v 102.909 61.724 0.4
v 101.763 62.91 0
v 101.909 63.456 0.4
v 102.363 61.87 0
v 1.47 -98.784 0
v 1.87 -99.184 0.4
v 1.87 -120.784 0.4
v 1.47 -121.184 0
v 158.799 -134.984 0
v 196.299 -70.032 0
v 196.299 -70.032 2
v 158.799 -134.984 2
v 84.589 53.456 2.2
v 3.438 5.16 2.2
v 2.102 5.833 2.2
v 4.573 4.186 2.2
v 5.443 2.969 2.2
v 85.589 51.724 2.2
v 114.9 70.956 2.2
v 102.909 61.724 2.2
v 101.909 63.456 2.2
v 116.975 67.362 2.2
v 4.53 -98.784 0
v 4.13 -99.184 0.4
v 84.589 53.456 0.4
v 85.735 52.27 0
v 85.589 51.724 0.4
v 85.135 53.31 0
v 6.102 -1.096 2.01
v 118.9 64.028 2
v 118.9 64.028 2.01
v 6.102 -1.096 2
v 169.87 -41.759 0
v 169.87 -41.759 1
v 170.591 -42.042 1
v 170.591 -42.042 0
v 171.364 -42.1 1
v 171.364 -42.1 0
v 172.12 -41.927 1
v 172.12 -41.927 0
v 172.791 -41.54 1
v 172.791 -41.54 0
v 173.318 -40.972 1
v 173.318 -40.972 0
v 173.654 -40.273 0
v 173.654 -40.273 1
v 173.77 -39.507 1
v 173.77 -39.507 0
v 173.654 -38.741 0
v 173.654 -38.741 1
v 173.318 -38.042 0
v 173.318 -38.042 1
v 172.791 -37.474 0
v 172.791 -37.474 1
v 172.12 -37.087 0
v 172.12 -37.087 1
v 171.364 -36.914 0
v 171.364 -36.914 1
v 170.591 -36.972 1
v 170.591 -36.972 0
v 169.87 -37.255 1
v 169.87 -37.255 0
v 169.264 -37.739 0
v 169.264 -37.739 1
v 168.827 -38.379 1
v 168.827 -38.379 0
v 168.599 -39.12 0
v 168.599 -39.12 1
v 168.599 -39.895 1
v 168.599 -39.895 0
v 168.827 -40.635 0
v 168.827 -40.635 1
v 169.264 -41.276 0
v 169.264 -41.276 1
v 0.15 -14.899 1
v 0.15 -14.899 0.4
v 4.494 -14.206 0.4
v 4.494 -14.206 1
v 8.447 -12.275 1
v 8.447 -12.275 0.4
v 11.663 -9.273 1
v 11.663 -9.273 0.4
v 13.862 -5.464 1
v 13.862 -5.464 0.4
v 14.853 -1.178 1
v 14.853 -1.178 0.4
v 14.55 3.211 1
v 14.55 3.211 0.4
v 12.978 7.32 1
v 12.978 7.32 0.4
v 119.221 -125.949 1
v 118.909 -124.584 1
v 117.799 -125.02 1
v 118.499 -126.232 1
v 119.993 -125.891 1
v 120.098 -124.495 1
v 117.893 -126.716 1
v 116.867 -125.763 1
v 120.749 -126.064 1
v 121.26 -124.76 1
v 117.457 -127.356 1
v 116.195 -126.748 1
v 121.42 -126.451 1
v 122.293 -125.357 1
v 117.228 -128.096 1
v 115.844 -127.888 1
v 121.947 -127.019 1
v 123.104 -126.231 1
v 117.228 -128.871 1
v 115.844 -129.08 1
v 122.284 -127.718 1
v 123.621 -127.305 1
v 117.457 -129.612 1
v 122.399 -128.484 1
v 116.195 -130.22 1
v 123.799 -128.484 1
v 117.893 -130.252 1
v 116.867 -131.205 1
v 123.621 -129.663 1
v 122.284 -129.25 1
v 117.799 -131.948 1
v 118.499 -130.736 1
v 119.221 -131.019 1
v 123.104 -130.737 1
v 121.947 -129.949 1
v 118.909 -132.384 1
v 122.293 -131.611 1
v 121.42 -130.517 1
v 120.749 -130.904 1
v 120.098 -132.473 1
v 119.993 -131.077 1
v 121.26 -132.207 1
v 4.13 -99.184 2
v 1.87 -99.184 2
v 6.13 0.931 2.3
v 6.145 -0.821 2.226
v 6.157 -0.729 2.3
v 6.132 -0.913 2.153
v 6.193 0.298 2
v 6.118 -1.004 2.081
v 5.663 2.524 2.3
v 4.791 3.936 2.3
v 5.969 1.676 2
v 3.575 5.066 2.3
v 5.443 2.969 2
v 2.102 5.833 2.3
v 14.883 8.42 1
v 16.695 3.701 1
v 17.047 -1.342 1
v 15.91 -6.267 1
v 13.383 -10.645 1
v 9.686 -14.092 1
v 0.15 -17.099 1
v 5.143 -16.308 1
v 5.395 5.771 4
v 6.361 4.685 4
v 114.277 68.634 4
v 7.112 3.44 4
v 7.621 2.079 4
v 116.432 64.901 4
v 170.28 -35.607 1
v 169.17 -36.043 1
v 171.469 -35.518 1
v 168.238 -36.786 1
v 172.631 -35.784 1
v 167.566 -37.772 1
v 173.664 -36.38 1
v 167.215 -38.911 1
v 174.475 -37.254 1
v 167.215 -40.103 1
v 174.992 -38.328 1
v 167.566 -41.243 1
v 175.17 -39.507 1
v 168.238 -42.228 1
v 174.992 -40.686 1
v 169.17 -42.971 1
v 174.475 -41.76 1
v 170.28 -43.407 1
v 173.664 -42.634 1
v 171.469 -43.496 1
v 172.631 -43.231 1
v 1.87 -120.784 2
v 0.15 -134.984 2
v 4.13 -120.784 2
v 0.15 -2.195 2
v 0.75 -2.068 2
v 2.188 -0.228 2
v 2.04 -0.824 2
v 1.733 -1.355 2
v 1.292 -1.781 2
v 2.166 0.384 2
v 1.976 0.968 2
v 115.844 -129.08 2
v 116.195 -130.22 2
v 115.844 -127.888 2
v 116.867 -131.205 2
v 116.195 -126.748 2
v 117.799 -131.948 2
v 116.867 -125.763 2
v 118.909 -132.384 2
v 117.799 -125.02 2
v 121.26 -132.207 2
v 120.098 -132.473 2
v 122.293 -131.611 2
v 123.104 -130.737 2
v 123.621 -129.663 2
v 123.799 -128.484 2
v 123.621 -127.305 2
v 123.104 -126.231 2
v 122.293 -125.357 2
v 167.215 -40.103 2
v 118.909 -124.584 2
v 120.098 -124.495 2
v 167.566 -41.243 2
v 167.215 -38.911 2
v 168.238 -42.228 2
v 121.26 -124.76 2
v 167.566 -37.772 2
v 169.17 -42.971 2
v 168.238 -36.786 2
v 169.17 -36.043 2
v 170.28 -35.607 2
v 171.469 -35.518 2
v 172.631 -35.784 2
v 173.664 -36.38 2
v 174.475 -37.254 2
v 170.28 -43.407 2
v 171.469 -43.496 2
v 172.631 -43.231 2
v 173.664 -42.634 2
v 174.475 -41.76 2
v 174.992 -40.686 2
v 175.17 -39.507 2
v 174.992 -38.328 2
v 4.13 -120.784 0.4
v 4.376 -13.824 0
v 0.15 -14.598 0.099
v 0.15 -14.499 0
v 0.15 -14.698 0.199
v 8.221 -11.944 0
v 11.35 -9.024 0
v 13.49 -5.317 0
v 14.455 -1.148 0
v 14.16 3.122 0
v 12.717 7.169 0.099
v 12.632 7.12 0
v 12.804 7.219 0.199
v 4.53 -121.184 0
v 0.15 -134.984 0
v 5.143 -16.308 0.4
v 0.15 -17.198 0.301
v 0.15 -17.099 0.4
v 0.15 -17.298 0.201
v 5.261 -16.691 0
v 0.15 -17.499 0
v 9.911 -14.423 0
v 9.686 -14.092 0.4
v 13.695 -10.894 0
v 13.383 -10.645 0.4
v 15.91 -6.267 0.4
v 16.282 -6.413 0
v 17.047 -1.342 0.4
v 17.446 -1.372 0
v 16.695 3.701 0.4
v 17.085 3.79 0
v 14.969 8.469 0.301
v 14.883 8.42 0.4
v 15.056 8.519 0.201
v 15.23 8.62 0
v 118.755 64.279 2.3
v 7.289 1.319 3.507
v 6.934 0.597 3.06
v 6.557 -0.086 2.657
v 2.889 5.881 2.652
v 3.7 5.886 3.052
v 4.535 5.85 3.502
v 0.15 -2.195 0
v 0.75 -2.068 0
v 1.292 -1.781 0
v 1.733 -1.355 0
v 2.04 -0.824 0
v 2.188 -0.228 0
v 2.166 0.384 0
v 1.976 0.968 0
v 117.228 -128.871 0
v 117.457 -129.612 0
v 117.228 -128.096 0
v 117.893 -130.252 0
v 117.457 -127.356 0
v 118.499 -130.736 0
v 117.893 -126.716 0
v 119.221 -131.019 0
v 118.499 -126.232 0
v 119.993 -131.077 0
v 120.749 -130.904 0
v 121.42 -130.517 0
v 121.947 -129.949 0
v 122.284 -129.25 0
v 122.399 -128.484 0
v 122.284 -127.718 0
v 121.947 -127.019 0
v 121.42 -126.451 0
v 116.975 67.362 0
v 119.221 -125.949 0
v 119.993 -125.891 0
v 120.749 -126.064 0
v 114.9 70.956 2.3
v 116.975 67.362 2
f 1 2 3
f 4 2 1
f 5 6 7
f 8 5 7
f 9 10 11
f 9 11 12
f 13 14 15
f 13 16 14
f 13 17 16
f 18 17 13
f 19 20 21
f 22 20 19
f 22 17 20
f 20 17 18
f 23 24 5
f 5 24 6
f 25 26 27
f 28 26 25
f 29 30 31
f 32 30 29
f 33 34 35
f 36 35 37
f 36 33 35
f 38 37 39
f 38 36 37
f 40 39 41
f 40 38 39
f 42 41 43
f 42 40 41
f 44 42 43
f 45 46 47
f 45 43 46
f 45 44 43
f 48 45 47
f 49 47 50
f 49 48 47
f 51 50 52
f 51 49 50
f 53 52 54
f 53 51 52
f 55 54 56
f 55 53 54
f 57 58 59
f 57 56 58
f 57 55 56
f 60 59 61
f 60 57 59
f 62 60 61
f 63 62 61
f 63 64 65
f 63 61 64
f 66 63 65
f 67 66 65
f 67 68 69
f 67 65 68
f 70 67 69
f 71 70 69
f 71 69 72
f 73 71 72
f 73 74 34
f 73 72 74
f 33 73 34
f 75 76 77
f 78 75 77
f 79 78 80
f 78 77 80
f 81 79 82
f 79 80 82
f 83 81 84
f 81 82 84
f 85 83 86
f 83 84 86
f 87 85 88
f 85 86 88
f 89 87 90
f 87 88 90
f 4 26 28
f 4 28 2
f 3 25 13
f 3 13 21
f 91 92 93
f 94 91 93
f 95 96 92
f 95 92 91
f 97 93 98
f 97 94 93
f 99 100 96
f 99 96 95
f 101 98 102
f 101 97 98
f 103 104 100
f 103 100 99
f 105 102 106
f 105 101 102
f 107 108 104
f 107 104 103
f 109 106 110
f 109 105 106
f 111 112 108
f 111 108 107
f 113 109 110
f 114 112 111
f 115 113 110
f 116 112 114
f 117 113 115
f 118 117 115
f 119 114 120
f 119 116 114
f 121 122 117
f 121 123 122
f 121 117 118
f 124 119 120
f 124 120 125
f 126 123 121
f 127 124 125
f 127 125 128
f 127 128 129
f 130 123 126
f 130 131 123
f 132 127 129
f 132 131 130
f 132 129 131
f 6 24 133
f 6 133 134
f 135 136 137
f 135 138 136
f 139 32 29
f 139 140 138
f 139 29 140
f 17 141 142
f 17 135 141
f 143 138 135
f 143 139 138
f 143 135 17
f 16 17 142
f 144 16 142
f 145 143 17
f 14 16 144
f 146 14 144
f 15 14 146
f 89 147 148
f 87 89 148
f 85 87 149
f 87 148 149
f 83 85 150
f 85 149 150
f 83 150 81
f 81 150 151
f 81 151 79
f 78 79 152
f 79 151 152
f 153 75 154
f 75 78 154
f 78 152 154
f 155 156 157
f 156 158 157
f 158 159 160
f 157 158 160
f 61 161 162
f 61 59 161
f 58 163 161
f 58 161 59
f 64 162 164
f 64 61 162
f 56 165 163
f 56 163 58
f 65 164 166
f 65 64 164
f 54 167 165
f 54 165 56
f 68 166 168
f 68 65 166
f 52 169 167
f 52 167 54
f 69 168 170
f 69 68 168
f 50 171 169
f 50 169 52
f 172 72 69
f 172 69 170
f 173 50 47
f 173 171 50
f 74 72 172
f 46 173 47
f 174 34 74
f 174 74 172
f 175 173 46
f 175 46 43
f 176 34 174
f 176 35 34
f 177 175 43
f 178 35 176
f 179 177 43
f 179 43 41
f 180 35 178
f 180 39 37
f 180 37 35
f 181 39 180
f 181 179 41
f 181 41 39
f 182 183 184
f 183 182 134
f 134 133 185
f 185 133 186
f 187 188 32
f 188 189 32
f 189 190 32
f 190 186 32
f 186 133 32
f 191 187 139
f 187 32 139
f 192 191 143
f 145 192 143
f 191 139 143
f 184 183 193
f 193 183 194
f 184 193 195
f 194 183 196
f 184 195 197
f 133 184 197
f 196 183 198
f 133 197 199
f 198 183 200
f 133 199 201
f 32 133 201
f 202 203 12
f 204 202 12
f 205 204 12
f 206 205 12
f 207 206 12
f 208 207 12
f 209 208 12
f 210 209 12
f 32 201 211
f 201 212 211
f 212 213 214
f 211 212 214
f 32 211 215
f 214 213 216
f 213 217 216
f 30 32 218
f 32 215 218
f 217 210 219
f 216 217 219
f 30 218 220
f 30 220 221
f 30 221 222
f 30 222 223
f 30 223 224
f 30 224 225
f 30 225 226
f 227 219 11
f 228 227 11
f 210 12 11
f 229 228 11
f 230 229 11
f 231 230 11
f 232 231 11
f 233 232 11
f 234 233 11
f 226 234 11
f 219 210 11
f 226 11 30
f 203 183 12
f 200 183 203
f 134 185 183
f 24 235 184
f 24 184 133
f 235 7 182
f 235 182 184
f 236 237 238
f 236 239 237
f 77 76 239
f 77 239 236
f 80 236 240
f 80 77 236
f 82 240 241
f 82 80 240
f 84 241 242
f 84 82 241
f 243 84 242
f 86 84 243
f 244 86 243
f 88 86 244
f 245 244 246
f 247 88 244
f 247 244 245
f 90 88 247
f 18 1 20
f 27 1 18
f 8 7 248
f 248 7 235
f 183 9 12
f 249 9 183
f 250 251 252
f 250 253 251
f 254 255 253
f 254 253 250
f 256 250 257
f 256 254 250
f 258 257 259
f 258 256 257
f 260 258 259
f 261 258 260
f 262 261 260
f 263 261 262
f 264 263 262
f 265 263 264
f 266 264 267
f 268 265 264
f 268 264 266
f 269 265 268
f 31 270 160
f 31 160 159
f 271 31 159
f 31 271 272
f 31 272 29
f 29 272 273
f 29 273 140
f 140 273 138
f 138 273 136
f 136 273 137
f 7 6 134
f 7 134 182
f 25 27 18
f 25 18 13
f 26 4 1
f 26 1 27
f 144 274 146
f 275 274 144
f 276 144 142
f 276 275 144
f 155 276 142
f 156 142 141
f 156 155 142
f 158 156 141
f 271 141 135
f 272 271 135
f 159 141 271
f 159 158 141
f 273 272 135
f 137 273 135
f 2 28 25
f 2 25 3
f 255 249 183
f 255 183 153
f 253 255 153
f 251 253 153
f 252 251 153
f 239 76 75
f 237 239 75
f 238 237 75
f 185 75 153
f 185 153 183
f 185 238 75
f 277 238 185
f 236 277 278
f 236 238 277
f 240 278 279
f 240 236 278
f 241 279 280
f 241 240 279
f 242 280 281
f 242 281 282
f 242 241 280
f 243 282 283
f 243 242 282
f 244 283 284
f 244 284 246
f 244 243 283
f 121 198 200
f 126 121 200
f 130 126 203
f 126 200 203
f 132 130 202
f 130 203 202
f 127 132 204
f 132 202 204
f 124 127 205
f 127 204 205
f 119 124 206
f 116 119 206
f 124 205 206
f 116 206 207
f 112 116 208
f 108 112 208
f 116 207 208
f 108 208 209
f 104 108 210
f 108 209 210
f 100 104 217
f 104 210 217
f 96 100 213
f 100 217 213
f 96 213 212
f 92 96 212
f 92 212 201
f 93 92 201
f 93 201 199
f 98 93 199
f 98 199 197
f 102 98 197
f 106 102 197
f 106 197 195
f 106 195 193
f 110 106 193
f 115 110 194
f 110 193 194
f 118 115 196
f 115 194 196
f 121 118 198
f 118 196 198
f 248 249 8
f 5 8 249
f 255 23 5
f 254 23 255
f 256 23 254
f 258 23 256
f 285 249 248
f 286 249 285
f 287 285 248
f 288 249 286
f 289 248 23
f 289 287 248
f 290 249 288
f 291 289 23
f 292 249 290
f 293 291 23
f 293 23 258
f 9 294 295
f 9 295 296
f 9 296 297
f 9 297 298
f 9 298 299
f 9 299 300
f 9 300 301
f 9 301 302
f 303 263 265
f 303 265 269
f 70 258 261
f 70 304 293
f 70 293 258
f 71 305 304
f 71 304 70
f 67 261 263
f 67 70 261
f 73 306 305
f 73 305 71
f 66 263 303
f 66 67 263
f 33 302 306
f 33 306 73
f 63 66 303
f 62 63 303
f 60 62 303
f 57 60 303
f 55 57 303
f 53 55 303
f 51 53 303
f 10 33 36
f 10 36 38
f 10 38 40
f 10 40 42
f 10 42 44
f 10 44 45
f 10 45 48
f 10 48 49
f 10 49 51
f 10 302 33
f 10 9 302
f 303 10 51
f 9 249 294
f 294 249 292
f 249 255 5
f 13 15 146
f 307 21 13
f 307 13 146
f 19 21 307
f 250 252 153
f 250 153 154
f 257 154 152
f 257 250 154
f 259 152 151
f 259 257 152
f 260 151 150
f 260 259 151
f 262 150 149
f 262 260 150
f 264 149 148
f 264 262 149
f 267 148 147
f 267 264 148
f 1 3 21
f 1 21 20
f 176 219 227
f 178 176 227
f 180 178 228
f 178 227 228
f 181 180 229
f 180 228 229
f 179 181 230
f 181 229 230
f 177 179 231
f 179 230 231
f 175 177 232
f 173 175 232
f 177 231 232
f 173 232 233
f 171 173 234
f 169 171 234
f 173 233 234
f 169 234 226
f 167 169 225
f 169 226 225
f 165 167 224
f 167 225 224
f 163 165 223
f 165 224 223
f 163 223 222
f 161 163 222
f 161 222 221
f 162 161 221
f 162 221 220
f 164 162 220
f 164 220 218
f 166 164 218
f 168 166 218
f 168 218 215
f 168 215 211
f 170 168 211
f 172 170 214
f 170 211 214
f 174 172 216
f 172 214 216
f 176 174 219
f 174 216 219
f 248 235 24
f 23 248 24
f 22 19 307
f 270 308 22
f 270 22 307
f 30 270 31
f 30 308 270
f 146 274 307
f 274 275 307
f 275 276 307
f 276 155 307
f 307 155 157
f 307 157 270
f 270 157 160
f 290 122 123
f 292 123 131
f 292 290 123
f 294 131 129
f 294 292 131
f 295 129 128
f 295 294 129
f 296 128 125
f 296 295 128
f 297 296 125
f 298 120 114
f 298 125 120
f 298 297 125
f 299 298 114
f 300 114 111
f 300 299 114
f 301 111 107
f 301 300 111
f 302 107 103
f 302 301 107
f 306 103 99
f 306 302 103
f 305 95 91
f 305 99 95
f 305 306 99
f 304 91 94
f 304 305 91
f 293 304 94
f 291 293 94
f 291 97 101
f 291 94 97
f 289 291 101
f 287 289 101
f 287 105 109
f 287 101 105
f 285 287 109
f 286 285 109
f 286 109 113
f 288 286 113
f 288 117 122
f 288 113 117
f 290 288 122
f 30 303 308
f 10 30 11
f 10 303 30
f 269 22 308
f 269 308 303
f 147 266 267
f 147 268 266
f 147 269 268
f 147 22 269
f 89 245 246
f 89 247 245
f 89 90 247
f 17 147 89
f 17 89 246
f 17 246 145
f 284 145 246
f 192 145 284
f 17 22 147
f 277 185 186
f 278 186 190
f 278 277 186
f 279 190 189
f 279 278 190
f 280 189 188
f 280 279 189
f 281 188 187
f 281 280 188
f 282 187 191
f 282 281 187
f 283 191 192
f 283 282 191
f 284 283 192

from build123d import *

# Parameters (mm, degrees)
SKETCH002_R             = 2.6
PAD001_DEPTH            = 2
PAD002_DEPTH            = 2
POCKET003_DEPTH         = 2.201
PAD003_DEPTH            = 2.2
POCKET004_DEPTH         = 4.001
SKETCH006_R             = 17.1
SKETCH006_R_2           = 14.9
POCKET002_DEPTH         = 1
CHAMFER002_SIZE         = 0.4
CHAMFER_SIZE            = 1.99
SKETCH004_R             = 2.2
POCKET_DEPTH            = 4.001
SKETCH005_R             = 6.2
POCKET001_DEPTH         = 2.001
SKETCH010_R             = 4
POCKET005_DEPTH         = 1
CHAMFER001_SIZE         = 1.7
BODY003_PLACEMENT_ANGLE = 240


with BuildPart() as part:
    # Sketch002 → Pad001 (new body)
    with BuildSketch(Plane.XY):
        Polygon((-116.824546, 67.621888), (-37.5, 205.016032), (37.5, 205.016032), (116.824546, 67.621888), (0, 0.173205), align=None)
        with Locations((-51.370835, 167.991041)):
            Circle(SKETCH002_R, mode=Mode.SUBTRACT)
        with Locations((51.370835, 167.991041)):
            Circle(SKETCH002_R, mode=Mode.SUBTRACT)
    extrude(amount=PAD001_DEPTH)

    # Sketch003 → Pad002 (join)
    with BuildSketch(Plane.XY.offset(2)):
        Polygon((-118.899546, 64.027883), (-114.899546, 70.956086), (-0.173205, 4.718802), (-0.173205, 0.1), (-4.173205, -2.209401), align=None)
    extrude(amount=PAD002_DEPTH)

    # Sketch007 → Pocket003 (cut, through all)
    with BuildSketch(Plane.XY.offset(2.2)):
        Polygon((-116.824546, 67.621888), (0, 0.173205), (-4.173205, -2.209401), (-118.899546, 64.027883), align=None)
    extrude(amount=-POCKET003_DEPTH, mode=Mode.SUBTRACT)

    # Sketch008 → Pad003 (join)
    with BuildSketch(Plane.XY):
        Polygon((-104.909165, 58.259933), (-87.588657, 48.259933), (-88.588657, 46.527883), (-105.909165, 56.527883), align=None)
    extrude(amount=PAD003_DEPTH)

    # Sketch009 → Pocket004 (cut, through all)
    with BuildSketch(Plane.XY):
        Polygon((83.830836, 53.168669), (84.960836, 51.211452), (103.666985, 62.011452), (102.536985, 63.968669), align=None)
    extrude(amount=POCKET004_DEPTH, mode=Mode.SUBTRACT)

    # Sketch006 → Pocket002 (cut)
    with BuildSketch(Plane.XY):
        Circle(SKETCH006_R)
        Circle(SKETCH006_R_2, mode=Mode.SUBTRACT)
    extrude(amount=POCKET002_DEPTH, mode=Mode.SUBTRACT)

    # Chamfer002
    chamfer002_edges = [part.edges().sort_by_distance(p)[0] for p in [
        (-96.248911, 53.259933, 0),
        (-88.088657, 47.393908, 0),
        (-97.248911, 51.527883, 0),
        (-105.409165, 57.393908, 0),
        (94.313911, 56.611452, 0),
        (103.101985, 62.99006, 0),
        (93.183911, 58.568669, 0),
        (84.395836, 52.19006, 0),
        (0, 14.9, 0),
        (0, 17.1, 0),
    ]]
    chamfer(chamfer002_edges, length=CHAMFER002_SIZE)

    # Chamfer
    chamfer_edges = [part.edges().sort_by_distance(p)[0] for p in [
        (-57.536375, 37.837444, 4),
    ]]
    chamfer(chamfer_edges, length=CHAMFER_SIZE)

    # Sketch004 → Pocket (cut, through all)
    with BuildSketch(Plane.XY):
        Circle(SKETCH004_R)
    extrude(amount=POCKET_DEPTH, mode=Mode.SUBTRACT)

    # Sketch005 → Pocket001 (cut, through all)
    with BuildSketch(Plane.XY.offset(2)):
        Circle(SKETCH005_R)
    extrude(amount=POCKET001_DEPTH, mode=Mode.SUBTRACT)

    # Sketch010 → Pocket005 (cut)
    with BuildSketch(Plane.XY.offset(2)):
        with Locations((-51.370835, 167.991041)):
            Circle(SKETCH010_R)
        with Locations((51.370835, 167.991041)):
            Circle(SKETCH010_R)
    extrude(amount=-POCKET005_DEPTH, mode=Mode.SUBTRACT)

    # Chamfer001
    chamfer001_edges = [part.edges().sort_by_distance(p)[0] for p in [
        (-5.849077, 2.056283, 4),
        (-62.500992, 31.466162, 4),
        (-117.397046, 66.630289, 4),
    ]]
    chamfer(chamfer001_edges, length=CHAMFER001_SIZE)


with BuildPart() as part_1:
    # Body003 placement: moved
    add(part.part.rotate(Axis((0, 0, 0), (0, 0, 1)), BODY003_PLACEMENT_ANGLE))


solid = part_1.part
